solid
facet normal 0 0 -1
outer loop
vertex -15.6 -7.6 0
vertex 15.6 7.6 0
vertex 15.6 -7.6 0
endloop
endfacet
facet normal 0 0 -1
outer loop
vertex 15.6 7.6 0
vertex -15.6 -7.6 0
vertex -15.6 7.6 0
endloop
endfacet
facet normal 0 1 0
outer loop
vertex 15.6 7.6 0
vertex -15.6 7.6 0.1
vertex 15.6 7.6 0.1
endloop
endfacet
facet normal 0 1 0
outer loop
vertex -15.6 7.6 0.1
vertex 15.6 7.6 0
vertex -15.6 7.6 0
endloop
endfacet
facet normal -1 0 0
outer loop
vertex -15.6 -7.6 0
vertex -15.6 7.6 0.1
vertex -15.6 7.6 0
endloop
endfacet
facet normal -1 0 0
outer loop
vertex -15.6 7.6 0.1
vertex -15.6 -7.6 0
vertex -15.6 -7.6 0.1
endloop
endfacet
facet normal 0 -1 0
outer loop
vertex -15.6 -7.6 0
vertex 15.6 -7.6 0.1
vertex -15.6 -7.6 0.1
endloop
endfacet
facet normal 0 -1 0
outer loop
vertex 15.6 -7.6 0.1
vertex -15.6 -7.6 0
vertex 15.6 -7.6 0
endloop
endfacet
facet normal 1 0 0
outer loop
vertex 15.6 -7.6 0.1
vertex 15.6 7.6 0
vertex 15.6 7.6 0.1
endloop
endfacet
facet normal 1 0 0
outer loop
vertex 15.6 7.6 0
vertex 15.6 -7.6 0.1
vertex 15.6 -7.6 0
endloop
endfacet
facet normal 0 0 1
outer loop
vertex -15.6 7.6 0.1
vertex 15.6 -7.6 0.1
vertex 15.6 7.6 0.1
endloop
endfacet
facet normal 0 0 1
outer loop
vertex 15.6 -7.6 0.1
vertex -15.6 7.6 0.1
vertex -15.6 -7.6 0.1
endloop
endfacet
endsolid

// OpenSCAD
// file: ../p/box5-12.scad
use <../lib.scad>
function ldraw_lib__box5_12() = [
// 0 Box with 5 Faces without Any Edges
// 0 Name: box5-12.dat
// 0 Author: Chris Dee [cwdee]
// 0 !LDRAW_ORG Primitive UPDATE 2009-02
// 0 !LICENSE Licensed under CC BY 4.0 : see CAreadme.txt
// 
// 0 BFC CERTIFY CCW
  [0,"BFC","CERTIFY"],
  [0,"BFC","CCW"],
// 
// 0 !HISTORY 2009-09-03 [PTadmin] Official Update 2009-02
// 
// 
// 4 16 1 1 1 1 1 -1 -1 1 -1 -1 1 1
  [4,16,1,1,1,1,1,-1,-1,1,-1,-1,1,1],
// 4 16 -1 0 1 1 0 1 1 1 1 -1 1 1
  [4,16,-1,0,1,1,0,1,1,1,1,-1,1,1],
// 4 16 -1 0 -1 -1 0 1 -1 1 1 -1 1 -1
  [4,16,-1,0,-1,-1,0,1,-1,1,1,-1,1,-1],
// 4 16 1 0 -1 -1 0 -1 -1 1 -1 1 1 -1
  [4,16,1,0,-1,-1,0,-1,-1,1,-1,1,1,-1],
// 4 16 1 0 1 1 0 -1 1 1 -1 1 1 1
  [4,16,1,0,1,1,0,-1,1,1,-1,1,1,1],
// 0
];
module ldraw_lib__box5_12(step=0, col=false, unit=2/5, alt=false, line=0.2, solid=!$preview)
    makepoly(ldraw_lib__box5_12(), step=step, col=col, unit=unit, alt=alt, line=line, solid=solid);
ldraw_lib__box5_12(line=0.2);
// main file
use <../lib.scad>
use <../p/box5-12.scad>
function ldraw_lib__4620860l() = [
// 0 Sticker  1.9 x  3.9 with Chrome Silver Mirror
// 0 Name: 4620860l.dat
// 0 Author: Takeshi Takahashi [RainbowDolphin]
// 0 !LDRAW_ORG Part UPDATE 2024-10
// 0 !LICENSE Licensed under CC BY 4.0 : see CAreadme.txt
// 
// 0 BFC CERTIFY CCW
  [0,"BFC","CERTIFY"],
  [0,"BFC","CCW"],
// 
// 0 !KEYWORDS Bathroom, Bricklink 3315stk01, Brickowl 604777, house, Olivia
// 0 !KEYWORDS Rebrickable 95460, set 3315
// 
// 0 !HISTORY 2024-12-01 [OrionP] Official Update 2024-10
// 
// 
// 1 16 0 -0.25 0 39 0 0 0 0.25 0 0 0 19 box5-12.dat
  [1,16,0,-0.25,0,39,0,0,0,0.25,0,0,0,19, ldraw_lib__box5_12()],
// 
// 4 383 39 -0.25 19 -39 -0.25 19 -39 -0.25 -19 39 -0.25 -19
  [4,383,39,-0.25,19,-39,-0.25,19,-39,-0.25,-19,39,-0.25,-19],
];
module ldraw_lib__4620860l(step=0, col=false, unit=2/5, alt=false, line=0.2, solid=!$preview)
    makepoly(ldraw_lib__4620860l(), step=step, col=col, unit=unit, alt=alt, line=line, solid=solid);
ldraw_lib__4620860l(line=0.2);
